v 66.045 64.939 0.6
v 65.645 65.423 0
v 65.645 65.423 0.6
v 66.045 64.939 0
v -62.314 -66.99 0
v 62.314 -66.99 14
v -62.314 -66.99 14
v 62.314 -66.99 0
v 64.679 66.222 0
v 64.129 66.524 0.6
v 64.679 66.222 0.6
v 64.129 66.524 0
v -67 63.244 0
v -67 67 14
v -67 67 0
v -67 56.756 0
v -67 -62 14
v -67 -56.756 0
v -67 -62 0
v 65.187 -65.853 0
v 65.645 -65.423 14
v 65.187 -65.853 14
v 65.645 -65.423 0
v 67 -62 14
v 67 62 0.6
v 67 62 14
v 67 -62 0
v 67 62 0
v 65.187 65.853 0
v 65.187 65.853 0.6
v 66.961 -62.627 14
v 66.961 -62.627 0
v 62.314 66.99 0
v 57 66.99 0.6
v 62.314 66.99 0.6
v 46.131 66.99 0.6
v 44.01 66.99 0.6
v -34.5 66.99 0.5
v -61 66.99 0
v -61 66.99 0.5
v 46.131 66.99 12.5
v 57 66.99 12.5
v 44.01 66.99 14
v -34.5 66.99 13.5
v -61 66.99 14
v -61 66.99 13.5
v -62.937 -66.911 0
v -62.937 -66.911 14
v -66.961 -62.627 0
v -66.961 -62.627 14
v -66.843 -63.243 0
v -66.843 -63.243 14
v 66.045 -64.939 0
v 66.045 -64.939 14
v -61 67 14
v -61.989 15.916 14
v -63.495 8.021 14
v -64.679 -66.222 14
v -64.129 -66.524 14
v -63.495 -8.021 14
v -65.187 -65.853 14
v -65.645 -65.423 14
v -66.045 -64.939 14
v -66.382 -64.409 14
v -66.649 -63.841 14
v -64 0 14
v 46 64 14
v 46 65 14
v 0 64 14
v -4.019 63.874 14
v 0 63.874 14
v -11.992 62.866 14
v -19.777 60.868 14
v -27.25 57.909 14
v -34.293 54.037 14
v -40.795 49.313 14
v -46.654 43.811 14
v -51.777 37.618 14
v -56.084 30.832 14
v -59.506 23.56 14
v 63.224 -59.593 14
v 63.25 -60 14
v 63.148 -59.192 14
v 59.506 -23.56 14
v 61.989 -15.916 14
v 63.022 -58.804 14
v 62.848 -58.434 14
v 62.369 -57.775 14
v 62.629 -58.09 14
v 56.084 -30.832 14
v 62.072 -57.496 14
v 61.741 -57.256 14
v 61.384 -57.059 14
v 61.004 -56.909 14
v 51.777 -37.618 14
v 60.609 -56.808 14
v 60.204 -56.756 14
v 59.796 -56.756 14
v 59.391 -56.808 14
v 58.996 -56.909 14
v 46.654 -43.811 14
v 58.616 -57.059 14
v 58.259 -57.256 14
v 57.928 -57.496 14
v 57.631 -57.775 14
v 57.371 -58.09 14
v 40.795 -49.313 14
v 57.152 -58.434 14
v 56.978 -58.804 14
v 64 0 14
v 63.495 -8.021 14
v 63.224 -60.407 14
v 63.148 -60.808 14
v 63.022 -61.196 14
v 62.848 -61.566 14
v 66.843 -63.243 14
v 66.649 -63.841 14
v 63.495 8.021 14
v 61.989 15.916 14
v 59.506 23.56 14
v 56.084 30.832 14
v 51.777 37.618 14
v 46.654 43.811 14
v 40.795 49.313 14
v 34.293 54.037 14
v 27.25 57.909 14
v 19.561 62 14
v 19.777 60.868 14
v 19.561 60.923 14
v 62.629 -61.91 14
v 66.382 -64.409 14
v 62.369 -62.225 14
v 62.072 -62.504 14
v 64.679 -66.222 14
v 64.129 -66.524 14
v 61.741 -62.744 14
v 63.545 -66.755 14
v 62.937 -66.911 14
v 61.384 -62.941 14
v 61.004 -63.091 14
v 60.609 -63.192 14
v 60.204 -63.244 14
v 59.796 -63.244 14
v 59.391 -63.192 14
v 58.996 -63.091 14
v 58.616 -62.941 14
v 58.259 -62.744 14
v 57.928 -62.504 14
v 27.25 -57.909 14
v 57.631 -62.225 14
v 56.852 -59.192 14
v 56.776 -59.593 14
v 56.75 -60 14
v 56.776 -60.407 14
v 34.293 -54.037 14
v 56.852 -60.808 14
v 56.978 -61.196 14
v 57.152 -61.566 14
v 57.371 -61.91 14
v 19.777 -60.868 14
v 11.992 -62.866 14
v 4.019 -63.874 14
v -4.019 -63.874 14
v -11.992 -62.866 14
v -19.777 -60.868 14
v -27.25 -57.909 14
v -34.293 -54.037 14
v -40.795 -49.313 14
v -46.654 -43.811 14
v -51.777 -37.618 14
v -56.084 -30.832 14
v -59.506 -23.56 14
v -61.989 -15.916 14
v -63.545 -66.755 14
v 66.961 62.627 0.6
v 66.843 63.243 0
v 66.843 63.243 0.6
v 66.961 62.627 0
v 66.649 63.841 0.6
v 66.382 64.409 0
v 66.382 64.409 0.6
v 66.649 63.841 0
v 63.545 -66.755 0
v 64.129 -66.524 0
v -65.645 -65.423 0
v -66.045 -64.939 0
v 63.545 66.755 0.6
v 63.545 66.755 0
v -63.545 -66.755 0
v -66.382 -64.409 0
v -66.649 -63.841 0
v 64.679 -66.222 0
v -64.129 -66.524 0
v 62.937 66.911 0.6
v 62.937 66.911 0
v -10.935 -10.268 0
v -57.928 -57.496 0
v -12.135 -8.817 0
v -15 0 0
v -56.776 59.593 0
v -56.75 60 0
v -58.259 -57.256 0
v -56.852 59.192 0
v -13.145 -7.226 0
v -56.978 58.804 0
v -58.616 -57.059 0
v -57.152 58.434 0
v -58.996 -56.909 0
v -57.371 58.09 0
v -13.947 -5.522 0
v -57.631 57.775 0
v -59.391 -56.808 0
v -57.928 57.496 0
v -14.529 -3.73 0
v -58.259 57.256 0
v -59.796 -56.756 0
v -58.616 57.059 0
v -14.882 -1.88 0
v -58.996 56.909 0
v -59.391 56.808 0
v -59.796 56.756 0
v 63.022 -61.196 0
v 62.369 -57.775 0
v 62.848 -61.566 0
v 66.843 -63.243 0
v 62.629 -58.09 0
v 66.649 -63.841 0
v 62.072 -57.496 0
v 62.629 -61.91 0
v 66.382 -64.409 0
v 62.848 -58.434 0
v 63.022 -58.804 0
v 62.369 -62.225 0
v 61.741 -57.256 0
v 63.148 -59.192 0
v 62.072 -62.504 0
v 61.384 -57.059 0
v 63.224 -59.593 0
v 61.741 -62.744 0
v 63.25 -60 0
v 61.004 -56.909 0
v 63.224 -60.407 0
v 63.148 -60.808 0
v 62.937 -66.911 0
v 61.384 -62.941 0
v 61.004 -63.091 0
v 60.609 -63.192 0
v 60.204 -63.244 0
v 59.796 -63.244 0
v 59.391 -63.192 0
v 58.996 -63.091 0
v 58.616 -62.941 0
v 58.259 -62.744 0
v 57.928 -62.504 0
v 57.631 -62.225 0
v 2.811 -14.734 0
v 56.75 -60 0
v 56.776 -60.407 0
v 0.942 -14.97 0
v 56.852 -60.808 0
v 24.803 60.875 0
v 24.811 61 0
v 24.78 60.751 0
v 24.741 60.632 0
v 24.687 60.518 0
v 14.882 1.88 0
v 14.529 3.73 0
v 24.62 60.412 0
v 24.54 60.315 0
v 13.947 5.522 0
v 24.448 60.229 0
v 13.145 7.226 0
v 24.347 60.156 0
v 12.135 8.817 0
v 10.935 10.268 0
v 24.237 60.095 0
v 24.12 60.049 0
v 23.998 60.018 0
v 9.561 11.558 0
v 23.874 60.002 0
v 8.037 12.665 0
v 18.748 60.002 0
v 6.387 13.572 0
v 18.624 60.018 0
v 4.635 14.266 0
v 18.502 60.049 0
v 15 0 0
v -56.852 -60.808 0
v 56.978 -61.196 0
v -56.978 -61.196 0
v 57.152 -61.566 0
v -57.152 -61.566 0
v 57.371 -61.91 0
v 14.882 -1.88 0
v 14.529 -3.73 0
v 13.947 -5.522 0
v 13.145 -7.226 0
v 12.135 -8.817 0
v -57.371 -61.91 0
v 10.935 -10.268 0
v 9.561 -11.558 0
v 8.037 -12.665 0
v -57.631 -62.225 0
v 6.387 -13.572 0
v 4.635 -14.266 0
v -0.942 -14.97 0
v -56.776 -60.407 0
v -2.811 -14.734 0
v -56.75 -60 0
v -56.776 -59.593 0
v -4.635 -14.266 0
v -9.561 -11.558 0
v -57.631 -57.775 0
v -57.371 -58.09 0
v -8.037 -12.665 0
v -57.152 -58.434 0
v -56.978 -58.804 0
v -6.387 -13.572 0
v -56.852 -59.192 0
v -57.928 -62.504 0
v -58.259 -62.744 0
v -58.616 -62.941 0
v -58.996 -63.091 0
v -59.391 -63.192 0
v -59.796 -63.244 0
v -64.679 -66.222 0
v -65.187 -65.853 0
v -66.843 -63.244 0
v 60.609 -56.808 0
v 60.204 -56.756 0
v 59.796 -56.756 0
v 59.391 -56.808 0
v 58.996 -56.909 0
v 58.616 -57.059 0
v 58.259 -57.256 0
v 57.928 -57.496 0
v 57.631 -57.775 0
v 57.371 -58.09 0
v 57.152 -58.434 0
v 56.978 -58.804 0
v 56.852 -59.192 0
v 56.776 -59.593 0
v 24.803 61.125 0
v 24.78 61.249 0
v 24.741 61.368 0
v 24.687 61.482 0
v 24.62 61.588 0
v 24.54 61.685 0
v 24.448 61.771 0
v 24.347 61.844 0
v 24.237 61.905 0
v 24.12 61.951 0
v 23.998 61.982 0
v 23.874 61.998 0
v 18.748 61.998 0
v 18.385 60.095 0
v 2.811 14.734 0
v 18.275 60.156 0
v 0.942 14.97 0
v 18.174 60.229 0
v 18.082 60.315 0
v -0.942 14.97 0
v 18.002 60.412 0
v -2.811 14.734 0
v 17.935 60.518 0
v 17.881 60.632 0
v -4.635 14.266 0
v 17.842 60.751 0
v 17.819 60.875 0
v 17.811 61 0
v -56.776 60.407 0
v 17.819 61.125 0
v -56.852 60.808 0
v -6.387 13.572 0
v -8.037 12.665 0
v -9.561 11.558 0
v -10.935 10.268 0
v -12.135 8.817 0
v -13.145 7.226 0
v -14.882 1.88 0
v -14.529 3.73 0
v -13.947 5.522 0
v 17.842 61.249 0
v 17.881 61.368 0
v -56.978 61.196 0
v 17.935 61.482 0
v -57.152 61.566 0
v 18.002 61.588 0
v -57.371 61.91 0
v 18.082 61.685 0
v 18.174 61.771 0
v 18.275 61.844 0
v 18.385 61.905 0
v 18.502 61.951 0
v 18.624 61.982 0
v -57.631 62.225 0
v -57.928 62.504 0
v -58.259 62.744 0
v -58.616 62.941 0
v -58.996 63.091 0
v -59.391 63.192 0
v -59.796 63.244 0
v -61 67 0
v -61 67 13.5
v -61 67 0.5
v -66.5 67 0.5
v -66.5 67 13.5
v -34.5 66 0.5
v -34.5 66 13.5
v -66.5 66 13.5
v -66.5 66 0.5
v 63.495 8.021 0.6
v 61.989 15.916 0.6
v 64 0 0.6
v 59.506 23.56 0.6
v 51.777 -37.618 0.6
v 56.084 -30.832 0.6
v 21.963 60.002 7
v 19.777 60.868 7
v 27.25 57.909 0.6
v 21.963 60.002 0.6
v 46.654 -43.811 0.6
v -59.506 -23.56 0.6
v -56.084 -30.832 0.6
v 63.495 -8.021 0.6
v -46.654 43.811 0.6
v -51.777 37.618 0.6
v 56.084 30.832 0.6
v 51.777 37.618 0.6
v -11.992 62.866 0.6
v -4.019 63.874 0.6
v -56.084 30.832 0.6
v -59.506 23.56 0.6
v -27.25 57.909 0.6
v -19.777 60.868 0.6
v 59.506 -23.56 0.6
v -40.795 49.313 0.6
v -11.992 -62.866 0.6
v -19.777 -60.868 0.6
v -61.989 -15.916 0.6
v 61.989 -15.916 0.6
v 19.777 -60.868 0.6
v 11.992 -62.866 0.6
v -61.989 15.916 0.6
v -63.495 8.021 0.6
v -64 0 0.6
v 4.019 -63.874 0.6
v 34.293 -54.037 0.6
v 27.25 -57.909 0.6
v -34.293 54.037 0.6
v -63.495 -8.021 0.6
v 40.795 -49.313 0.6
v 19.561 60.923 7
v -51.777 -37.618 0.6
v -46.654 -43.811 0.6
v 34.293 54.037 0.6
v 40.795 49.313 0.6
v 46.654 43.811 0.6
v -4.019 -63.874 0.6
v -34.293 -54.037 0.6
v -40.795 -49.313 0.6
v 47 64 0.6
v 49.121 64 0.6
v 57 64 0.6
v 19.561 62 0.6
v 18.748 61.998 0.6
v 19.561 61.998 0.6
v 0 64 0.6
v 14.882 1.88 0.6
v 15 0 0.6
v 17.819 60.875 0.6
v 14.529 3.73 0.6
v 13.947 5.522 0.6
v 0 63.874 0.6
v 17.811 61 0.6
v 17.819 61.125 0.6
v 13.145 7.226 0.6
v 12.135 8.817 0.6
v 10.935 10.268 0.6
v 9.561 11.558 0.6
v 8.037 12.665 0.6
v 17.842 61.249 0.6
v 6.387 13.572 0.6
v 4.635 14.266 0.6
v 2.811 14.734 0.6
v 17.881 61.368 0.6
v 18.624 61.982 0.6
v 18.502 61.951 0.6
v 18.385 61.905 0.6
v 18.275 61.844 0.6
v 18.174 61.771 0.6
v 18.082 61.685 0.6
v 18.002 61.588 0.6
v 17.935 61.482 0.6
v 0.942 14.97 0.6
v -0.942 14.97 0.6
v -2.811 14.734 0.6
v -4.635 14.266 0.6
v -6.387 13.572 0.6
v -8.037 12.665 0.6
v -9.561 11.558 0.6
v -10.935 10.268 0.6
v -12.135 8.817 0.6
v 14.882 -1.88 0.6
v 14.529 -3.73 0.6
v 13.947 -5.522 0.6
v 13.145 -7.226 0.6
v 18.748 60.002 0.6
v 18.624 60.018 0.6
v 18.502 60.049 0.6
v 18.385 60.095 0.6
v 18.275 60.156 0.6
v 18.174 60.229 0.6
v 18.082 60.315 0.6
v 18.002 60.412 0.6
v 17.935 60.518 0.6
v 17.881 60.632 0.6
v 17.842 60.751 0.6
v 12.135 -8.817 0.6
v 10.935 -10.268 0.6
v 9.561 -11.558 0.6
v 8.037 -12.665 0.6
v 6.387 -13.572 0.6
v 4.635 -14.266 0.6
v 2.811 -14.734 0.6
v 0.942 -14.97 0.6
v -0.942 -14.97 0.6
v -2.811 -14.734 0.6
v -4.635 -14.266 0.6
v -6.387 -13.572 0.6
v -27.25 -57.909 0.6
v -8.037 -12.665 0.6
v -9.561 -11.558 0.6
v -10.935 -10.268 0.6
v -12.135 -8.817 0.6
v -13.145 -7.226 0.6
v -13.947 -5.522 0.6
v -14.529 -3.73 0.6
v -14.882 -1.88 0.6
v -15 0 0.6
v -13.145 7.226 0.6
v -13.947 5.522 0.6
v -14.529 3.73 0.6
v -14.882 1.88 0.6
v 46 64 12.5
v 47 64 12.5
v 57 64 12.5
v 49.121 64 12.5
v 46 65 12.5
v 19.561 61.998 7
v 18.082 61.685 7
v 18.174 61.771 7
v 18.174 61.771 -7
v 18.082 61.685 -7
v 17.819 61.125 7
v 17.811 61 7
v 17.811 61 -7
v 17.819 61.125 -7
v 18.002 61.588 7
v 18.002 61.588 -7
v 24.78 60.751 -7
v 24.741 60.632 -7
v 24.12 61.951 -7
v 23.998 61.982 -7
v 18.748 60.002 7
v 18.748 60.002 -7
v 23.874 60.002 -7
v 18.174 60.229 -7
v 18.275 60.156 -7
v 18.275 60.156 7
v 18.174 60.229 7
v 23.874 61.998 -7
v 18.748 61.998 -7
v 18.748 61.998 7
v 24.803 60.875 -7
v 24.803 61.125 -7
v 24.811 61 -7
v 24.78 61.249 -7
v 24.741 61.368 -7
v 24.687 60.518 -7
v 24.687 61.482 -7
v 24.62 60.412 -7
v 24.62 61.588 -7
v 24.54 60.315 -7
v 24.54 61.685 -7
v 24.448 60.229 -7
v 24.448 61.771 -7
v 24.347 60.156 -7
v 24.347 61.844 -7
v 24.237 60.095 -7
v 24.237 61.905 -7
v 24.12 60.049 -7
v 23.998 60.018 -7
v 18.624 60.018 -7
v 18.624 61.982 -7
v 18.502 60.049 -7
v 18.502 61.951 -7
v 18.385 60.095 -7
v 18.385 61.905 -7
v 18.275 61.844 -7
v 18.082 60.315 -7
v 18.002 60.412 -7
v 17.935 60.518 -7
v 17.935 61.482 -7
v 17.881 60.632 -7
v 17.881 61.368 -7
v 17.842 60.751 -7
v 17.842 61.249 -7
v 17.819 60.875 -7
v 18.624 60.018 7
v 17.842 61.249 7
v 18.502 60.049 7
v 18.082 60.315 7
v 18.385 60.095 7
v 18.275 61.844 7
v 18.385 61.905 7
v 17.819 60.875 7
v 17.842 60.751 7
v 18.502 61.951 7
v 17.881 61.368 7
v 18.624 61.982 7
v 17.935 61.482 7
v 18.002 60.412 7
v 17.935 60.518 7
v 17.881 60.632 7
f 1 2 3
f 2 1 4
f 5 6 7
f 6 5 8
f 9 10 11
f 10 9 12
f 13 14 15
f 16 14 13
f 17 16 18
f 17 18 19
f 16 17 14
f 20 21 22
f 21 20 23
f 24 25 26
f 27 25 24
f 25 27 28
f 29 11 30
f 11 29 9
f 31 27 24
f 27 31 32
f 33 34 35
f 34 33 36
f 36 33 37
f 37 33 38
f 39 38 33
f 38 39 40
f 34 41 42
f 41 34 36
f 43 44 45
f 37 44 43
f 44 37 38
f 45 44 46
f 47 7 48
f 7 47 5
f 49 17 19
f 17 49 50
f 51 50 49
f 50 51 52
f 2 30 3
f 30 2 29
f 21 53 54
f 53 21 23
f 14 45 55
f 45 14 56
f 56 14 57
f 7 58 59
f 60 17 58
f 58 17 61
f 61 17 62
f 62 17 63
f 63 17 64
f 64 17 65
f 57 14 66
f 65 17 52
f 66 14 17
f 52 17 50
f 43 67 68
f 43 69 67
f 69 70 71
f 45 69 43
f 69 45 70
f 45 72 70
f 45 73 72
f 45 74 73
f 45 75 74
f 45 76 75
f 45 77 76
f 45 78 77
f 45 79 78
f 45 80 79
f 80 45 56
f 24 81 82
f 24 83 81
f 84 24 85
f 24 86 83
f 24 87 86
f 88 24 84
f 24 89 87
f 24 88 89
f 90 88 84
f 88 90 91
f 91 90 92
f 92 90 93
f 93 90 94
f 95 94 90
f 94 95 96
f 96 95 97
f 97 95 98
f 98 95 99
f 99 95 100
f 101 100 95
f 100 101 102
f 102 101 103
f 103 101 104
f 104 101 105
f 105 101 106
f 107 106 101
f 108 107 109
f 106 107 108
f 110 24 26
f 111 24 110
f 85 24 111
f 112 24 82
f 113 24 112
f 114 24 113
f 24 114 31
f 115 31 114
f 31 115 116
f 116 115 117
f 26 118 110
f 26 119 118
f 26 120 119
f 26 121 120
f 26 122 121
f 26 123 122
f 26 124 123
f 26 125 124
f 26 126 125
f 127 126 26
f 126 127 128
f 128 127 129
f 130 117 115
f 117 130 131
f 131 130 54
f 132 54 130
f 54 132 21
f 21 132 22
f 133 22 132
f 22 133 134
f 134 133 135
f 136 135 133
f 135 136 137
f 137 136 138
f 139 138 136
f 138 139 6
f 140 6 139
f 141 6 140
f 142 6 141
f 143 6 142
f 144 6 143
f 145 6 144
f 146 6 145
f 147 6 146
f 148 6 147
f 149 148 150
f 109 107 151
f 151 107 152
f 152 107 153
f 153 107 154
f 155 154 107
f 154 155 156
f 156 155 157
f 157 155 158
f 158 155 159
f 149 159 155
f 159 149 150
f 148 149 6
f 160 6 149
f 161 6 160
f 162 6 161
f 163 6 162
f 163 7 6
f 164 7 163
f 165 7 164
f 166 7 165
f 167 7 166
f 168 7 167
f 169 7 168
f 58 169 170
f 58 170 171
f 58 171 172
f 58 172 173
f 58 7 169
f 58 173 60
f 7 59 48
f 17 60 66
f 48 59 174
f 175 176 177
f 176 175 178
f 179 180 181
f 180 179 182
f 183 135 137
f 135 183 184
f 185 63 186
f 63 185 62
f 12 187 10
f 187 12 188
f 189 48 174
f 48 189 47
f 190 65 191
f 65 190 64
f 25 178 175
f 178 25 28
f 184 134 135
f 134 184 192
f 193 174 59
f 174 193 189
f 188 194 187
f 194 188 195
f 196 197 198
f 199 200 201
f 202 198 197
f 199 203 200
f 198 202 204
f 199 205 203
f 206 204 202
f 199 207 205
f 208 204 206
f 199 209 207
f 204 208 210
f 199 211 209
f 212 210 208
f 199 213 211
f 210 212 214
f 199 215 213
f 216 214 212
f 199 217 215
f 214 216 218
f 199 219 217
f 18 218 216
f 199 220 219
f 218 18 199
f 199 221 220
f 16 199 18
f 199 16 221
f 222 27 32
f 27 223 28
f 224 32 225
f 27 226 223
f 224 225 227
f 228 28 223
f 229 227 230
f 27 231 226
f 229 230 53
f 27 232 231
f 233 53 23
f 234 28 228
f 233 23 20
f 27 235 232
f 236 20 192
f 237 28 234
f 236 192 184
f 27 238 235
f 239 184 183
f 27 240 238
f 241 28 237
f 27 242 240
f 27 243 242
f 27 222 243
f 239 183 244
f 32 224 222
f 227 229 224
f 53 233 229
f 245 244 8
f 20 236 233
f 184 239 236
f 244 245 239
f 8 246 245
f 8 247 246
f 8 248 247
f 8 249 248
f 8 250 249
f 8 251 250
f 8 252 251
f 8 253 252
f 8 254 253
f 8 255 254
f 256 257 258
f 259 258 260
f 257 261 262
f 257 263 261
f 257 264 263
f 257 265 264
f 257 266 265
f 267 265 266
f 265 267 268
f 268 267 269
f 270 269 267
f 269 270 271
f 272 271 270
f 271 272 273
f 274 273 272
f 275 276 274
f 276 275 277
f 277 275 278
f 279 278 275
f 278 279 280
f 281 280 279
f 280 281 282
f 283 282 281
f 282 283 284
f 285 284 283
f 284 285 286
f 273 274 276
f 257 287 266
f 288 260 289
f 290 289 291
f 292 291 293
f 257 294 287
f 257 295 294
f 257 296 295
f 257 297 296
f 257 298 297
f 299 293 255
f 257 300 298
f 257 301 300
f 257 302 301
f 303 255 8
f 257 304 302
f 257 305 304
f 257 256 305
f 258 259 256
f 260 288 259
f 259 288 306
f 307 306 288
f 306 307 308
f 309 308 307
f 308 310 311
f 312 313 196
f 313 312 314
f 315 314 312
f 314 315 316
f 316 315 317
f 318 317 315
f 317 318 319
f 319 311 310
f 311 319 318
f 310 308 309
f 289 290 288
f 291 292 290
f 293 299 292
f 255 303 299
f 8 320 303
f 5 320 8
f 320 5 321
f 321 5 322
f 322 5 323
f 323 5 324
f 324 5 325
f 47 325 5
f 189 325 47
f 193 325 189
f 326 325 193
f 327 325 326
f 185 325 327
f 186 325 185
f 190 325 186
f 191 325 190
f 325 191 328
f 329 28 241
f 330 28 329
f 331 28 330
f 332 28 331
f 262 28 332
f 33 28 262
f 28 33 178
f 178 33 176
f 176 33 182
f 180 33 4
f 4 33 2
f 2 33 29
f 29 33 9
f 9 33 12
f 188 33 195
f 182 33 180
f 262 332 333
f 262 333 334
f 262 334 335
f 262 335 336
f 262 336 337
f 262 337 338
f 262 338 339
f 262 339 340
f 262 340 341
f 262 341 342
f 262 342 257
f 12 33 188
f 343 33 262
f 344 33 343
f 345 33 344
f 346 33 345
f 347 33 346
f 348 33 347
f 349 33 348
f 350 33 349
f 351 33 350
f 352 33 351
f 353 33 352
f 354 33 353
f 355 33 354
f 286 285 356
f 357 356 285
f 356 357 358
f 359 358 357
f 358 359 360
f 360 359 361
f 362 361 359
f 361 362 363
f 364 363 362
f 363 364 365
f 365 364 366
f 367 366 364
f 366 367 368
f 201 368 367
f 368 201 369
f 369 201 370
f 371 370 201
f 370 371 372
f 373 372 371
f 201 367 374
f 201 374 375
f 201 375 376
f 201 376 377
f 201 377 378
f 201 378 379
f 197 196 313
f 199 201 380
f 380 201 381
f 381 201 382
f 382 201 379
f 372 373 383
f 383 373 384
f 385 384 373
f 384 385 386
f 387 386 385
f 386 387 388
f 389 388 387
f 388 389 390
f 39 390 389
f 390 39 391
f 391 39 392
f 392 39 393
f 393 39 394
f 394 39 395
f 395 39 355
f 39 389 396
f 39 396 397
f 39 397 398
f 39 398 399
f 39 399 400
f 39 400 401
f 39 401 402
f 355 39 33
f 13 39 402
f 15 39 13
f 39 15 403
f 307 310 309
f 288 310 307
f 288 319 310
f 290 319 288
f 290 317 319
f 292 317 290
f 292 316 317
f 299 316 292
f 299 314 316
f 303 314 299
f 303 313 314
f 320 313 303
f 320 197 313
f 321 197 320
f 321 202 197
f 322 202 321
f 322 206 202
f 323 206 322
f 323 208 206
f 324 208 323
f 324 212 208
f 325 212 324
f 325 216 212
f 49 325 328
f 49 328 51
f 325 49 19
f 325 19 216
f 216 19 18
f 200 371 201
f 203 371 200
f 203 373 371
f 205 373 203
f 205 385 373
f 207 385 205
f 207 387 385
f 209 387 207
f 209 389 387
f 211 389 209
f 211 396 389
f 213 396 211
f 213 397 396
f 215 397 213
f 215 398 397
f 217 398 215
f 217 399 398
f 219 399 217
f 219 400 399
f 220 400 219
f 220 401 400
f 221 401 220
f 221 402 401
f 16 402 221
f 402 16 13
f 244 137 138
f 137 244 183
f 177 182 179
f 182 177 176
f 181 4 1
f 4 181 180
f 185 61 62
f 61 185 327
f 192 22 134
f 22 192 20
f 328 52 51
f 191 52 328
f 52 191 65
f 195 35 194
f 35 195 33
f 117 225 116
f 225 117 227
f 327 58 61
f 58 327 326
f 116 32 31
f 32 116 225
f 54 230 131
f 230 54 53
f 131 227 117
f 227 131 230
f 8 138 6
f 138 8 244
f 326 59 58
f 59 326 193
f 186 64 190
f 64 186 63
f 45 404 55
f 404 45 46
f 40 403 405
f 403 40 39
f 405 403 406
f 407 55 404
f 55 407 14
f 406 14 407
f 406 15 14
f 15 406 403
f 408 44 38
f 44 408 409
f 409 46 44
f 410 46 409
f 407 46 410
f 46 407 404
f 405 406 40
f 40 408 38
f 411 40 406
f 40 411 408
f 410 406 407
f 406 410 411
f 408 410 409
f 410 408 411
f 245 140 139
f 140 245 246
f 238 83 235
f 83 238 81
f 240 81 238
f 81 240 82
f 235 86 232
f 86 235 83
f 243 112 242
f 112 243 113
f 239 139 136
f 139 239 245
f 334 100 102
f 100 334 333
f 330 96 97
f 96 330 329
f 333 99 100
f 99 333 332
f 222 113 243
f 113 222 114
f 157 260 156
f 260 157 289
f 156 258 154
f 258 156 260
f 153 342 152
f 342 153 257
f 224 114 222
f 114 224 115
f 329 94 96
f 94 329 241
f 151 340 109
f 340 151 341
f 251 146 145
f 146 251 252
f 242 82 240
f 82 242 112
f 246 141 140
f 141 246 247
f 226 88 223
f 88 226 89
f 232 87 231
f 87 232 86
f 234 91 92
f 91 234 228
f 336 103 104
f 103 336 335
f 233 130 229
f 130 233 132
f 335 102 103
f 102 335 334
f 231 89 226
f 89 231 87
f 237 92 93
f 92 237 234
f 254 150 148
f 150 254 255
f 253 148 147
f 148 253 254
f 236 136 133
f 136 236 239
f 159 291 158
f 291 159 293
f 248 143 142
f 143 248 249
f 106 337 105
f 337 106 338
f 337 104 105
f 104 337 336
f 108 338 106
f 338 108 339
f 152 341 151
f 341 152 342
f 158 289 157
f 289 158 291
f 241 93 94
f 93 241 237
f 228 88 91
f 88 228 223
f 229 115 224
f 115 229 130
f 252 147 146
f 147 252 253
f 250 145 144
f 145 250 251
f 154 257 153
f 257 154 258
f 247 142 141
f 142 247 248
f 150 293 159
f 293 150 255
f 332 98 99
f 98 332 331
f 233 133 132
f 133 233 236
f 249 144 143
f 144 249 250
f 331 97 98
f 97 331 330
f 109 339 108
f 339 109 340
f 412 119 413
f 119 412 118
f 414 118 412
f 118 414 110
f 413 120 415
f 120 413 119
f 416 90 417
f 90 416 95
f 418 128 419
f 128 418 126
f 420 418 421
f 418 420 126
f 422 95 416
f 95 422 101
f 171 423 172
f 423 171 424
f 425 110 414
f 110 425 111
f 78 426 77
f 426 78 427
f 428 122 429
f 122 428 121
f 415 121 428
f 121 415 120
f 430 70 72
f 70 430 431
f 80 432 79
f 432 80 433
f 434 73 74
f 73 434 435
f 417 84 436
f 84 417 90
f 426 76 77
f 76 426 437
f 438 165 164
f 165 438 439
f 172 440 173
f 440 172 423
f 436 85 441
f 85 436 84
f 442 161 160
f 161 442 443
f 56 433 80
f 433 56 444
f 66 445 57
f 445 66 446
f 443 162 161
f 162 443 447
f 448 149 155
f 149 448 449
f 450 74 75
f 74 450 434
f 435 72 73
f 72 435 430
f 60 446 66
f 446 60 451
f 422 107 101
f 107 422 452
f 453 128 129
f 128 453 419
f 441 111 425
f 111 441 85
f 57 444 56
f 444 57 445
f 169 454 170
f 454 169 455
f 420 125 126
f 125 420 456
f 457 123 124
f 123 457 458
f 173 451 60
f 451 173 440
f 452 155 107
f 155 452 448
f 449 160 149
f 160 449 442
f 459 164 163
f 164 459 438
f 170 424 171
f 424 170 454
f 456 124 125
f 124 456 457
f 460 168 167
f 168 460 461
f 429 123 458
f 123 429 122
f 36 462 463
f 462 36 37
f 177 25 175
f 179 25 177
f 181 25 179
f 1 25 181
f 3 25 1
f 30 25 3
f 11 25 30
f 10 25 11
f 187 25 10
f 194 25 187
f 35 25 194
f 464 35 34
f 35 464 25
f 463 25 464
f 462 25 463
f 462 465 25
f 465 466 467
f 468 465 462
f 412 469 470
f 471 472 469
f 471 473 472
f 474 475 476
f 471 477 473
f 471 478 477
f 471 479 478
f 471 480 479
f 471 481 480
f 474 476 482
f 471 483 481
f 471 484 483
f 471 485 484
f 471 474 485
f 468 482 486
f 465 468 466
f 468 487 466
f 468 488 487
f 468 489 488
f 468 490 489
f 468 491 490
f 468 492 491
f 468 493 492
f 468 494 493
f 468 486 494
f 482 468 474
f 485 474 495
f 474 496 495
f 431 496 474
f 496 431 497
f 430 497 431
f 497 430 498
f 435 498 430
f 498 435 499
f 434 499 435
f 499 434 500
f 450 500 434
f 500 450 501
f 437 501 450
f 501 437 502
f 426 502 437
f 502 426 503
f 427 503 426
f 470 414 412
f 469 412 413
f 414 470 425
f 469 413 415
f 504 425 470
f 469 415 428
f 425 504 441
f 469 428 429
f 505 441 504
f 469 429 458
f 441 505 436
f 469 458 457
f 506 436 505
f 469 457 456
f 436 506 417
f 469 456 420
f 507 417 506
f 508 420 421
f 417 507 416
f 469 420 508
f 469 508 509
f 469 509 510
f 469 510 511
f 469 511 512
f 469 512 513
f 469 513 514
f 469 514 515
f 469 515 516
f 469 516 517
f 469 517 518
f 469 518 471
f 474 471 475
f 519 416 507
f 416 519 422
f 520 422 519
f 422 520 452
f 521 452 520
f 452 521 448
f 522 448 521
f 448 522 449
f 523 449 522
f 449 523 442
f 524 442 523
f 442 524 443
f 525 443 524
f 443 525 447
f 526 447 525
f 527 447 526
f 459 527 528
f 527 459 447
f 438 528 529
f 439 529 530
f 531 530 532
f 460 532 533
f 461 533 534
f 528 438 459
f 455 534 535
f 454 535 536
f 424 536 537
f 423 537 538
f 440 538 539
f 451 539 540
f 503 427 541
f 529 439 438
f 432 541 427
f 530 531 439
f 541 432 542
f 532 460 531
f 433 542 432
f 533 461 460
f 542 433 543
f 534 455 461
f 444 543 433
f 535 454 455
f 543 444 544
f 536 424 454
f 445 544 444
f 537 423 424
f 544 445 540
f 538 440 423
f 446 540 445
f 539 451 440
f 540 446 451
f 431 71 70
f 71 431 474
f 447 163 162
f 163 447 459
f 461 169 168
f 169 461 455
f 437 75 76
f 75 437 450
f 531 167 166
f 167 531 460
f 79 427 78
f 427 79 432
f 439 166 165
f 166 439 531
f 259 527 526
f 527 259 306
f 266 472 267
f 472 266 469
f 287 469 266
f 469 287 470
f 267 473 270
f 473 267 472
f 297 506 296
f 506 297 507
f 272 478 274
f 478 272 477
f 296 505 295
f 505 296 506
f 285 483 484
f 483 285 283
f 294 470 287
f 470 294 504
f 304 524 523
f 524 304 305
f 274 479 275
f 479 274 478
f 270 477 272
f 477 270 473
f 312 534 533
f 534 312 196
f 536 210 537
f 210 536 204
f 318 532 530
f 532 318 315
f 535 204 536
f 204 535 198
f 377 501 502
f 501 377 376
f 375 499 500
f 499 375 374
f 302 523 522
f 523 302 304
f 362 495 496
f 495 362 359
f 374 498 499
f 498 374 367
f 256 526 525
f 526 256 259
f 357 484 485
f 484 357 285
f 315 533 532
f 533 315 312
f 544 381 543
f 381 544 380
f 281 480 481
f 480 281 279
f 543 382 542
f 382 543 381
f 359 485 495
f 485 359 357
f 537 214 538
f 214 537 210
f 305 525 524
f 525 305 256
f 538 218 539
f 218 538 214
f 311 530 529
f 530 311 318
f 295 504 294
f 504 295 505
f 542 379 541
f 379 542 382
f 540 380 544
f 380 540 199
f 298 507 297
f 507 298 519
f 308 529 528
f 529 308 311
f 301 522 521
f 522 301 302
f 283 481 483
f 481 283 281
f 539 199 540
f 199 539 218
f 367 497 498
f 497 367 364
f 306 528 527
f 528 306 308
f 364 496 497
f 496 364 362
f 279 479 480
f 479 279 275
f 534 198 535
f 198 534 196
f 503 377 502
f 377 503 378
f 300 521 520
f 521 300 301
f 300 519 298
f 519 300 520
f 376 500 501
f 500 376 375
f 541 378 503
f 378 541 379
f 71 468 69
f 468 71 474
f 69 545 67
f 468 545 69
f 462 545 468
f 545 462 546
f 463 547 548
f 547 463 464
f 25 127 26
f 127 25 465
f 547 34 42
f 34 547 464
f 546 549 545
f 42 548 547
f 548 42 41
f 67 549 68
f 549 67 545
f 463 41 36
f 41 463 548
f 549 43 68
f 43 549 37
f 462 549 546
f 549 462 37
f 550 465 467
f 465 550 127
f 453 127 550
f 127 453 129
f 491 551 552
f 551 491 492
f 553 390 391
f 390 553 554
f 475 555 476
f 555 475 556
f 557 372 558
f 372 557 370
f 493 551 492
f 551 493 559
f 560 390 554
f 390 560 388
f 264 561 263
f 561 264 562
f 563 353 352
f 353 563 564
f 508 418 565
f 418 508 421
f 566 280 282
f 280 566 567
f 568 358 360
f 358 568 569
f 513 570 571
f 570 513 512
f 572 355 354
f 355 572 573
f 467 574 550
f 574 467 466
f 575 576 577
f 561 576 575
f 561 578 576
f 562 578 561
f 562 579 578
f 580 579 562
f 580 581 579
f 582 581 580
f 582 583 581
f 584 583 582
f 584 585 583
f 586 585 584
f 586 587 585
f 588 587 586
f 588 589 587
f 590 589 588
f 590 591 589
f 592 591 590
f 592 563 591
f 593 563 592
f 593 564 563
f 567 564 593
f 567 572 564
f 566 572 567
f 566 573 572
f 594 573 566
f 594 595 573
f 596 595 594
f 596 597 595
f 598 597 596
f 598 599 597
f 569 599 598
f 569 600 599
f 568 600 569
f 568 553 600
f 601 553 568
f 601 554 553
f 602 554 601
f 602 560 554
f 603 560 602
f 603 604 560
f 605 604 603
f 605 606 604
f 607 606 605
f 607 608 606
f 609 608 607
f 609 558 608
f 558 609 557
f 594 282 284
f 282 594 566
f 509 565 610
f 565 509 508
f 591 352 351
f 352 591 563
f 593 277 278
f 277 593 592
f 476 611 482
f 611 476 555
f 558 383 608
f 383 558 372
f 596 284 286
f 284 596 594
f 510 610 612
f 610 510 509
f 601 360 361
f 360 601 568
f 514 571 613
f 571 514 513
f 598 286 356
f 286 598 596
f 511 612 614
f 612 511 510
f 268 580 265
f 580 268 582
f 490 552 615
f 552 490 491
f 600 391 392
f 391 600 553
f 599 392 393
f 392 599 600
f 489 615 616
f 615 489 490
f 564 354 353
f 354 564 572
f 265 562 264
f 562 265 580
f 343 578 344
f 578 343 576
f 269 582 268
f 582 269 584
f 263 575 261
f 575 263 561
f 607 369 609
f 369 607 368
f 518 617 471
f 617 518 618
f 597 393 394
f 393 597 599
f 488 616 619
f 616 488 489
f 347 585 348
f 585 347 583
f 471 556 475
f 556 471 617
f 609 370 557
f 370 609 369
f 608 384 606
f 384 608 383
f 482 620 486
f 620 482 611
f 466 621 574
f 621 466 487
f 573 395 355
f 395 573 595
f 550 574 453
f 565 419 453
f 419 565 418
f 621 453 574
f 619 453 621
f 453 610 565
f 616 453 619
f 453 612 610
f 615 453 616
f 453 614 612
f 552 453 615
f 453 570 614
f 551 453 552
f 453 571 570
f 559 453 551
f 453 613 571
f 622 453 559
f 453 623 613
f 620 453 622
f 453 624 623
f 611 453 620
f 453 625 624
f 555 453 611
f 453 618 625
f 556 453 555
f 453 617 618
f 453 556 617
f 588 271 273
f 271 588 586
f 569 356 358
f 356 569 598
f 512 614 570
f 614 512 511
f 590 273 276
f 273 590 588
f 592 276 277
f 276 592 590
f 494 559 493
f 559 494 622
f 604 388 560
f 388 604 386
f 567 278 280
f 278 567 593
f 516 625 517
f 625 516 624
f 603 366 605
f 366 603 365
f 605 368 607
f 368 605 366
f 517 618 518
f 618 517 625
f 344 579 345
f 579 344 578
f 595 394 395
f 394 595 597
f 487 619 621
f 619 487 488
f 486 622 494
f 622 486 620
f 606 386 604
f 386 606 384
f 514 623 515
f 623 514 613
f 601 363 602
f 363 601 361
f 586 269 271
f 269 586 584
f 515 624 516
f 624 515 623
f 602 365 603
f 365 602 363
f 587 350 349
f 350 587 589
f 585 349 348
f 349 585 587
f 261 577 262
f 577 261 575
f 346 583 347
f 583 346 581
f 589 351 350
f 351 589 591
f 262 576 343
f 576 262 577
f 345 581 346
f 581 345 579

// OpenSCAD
$fn = 50;


union() {
	difference() {
		union() {
			hull() {
				translate(v = [-62.0000000000, 62.0000000000, 0]) {
					cylinder(h = 14, r = 5);
				}
				translate(v = [62.0000000000, 62.0000000000, 0]) {
					cylinder(h = 14, r = 5);
				}
				translate(v = [-62.0000000000, -62.0000000000, 0]) {
					cylinder(h = 14, r = 5);
				}
				translate(v = [62.0000000000, -62.0000000000, 0]) {
					cylinder(h = 14, r = 5);
				}
			}
			translate(v = [-67.0000000000, 61.0000000000, 0]) {
				cube(size = [6, 6, 14]);
			}
		}
		union() {
			translate(v = [-67.5000000000, -60.0000000000, -250.0000000000]) {
				rotate(a = [0, 0, 0]) {
					difference() {
						union() {
							hull() {
								translate(v = [7.5000000000, 0, 0]) {
									cylinder(h = 250, r = 3.2500000000, r1 = 3.2500000000, r2 = 3.2500000000);
								}
								translate(v = [-7.5000000000, 0, 0]) {
									cylinder(h = 250, r = 3.2500000000, r1 = 3.2500000000, r2 = 3.2500000000);
								}
							}
						}
						union();
					}
				}
			}
			translate(v = [-67.5000000000, 60.0000000000, -250.0000000000]) {
				rotate(a = [0, 0, 0]) {
					difference() {
						union() {
							hull() {
								translate(v = [7.5000000000, 0, 0]) {
									cylinder(h = 250, r = 3.2500000000, r1 = 3.2500000000, r2 = 3.2500000000);
								}
								translate(v = [-7.5000000000, 0, 0]) {
									cylinder(h = 250, r = 3.2500000000, r1 = 3.2500000000, r2 = 3.2500000000);
								}
							}
						}
						union();
					}
				}
			}
			translate(v = [-66.5000000000, 66.0000000000, 0.5000000000]) {
				cube(size = [32, 1, 13.0000000000]);
			}
			translate(v = [60.0000000000, -60.0000000000, 0]) {
				cylinder(h = 100, r = 3.2500000000);
			}
			translate(v = [0, 0, 0.6000000000]) {
				cylinder(h = 16.4000000000, r = 64.0000000000);
			}
			translate(v = [0, 0, -7.0000000000]) {
				cylinder(h = 14, r = 15.0000000000);
			}
			translate(v = [0.0000000000, 62.0000000000, 0.6000000000]) {
				cube(size = [67.0000000000, 2, 16.4000000000]);
			}
			translate(v = [57.0000000000, 62.0000000000, 0.6000000000]) {
				cube(size = [10, 5, 16.4000000000]);
			}
			translate(v = [46.0000000000, 62.0000000000, 12.5000000000]) {
				cube(size = [21, 5, 1.5000000000]);
			}
			translate(v = [43.2500000000, 67.7500000000, 0.6000000000]) {
				rotate(a = [0, 0, -45]) {
					cube(size = [7.5000000000, 1.5000000000, 16.4000000000]);
				}
			}
			translate(v = [12.0610000000, 60.0000000000, 0.6000000000]) {
				cube(size = [7.5000000000, 2, 13.4000000000]);
			}
		}
	}
	union() {
		translate(v = [21.3110000000, 61.0000000000, -7.0000000000]) {
			rotate(a = [0, 0, 0]) {
				difference() {
					union() {
						#hull() {
							#translate(v = [2.5000000000, 0, 0]) {
								cylinder(h = 14, r = 1.0000000000, r1 = 1.0000000000, r2 = 1.0000000000);
							}
							#translate(v = [-2.5000000000, 0, 0]) {
								cylinder(h = 14, r = 1.0000000000, r1 = 1.0000000000, r2 = 1.0000000000);
							}
						}
					}
					union();
				}
			}
		}
	}
}
